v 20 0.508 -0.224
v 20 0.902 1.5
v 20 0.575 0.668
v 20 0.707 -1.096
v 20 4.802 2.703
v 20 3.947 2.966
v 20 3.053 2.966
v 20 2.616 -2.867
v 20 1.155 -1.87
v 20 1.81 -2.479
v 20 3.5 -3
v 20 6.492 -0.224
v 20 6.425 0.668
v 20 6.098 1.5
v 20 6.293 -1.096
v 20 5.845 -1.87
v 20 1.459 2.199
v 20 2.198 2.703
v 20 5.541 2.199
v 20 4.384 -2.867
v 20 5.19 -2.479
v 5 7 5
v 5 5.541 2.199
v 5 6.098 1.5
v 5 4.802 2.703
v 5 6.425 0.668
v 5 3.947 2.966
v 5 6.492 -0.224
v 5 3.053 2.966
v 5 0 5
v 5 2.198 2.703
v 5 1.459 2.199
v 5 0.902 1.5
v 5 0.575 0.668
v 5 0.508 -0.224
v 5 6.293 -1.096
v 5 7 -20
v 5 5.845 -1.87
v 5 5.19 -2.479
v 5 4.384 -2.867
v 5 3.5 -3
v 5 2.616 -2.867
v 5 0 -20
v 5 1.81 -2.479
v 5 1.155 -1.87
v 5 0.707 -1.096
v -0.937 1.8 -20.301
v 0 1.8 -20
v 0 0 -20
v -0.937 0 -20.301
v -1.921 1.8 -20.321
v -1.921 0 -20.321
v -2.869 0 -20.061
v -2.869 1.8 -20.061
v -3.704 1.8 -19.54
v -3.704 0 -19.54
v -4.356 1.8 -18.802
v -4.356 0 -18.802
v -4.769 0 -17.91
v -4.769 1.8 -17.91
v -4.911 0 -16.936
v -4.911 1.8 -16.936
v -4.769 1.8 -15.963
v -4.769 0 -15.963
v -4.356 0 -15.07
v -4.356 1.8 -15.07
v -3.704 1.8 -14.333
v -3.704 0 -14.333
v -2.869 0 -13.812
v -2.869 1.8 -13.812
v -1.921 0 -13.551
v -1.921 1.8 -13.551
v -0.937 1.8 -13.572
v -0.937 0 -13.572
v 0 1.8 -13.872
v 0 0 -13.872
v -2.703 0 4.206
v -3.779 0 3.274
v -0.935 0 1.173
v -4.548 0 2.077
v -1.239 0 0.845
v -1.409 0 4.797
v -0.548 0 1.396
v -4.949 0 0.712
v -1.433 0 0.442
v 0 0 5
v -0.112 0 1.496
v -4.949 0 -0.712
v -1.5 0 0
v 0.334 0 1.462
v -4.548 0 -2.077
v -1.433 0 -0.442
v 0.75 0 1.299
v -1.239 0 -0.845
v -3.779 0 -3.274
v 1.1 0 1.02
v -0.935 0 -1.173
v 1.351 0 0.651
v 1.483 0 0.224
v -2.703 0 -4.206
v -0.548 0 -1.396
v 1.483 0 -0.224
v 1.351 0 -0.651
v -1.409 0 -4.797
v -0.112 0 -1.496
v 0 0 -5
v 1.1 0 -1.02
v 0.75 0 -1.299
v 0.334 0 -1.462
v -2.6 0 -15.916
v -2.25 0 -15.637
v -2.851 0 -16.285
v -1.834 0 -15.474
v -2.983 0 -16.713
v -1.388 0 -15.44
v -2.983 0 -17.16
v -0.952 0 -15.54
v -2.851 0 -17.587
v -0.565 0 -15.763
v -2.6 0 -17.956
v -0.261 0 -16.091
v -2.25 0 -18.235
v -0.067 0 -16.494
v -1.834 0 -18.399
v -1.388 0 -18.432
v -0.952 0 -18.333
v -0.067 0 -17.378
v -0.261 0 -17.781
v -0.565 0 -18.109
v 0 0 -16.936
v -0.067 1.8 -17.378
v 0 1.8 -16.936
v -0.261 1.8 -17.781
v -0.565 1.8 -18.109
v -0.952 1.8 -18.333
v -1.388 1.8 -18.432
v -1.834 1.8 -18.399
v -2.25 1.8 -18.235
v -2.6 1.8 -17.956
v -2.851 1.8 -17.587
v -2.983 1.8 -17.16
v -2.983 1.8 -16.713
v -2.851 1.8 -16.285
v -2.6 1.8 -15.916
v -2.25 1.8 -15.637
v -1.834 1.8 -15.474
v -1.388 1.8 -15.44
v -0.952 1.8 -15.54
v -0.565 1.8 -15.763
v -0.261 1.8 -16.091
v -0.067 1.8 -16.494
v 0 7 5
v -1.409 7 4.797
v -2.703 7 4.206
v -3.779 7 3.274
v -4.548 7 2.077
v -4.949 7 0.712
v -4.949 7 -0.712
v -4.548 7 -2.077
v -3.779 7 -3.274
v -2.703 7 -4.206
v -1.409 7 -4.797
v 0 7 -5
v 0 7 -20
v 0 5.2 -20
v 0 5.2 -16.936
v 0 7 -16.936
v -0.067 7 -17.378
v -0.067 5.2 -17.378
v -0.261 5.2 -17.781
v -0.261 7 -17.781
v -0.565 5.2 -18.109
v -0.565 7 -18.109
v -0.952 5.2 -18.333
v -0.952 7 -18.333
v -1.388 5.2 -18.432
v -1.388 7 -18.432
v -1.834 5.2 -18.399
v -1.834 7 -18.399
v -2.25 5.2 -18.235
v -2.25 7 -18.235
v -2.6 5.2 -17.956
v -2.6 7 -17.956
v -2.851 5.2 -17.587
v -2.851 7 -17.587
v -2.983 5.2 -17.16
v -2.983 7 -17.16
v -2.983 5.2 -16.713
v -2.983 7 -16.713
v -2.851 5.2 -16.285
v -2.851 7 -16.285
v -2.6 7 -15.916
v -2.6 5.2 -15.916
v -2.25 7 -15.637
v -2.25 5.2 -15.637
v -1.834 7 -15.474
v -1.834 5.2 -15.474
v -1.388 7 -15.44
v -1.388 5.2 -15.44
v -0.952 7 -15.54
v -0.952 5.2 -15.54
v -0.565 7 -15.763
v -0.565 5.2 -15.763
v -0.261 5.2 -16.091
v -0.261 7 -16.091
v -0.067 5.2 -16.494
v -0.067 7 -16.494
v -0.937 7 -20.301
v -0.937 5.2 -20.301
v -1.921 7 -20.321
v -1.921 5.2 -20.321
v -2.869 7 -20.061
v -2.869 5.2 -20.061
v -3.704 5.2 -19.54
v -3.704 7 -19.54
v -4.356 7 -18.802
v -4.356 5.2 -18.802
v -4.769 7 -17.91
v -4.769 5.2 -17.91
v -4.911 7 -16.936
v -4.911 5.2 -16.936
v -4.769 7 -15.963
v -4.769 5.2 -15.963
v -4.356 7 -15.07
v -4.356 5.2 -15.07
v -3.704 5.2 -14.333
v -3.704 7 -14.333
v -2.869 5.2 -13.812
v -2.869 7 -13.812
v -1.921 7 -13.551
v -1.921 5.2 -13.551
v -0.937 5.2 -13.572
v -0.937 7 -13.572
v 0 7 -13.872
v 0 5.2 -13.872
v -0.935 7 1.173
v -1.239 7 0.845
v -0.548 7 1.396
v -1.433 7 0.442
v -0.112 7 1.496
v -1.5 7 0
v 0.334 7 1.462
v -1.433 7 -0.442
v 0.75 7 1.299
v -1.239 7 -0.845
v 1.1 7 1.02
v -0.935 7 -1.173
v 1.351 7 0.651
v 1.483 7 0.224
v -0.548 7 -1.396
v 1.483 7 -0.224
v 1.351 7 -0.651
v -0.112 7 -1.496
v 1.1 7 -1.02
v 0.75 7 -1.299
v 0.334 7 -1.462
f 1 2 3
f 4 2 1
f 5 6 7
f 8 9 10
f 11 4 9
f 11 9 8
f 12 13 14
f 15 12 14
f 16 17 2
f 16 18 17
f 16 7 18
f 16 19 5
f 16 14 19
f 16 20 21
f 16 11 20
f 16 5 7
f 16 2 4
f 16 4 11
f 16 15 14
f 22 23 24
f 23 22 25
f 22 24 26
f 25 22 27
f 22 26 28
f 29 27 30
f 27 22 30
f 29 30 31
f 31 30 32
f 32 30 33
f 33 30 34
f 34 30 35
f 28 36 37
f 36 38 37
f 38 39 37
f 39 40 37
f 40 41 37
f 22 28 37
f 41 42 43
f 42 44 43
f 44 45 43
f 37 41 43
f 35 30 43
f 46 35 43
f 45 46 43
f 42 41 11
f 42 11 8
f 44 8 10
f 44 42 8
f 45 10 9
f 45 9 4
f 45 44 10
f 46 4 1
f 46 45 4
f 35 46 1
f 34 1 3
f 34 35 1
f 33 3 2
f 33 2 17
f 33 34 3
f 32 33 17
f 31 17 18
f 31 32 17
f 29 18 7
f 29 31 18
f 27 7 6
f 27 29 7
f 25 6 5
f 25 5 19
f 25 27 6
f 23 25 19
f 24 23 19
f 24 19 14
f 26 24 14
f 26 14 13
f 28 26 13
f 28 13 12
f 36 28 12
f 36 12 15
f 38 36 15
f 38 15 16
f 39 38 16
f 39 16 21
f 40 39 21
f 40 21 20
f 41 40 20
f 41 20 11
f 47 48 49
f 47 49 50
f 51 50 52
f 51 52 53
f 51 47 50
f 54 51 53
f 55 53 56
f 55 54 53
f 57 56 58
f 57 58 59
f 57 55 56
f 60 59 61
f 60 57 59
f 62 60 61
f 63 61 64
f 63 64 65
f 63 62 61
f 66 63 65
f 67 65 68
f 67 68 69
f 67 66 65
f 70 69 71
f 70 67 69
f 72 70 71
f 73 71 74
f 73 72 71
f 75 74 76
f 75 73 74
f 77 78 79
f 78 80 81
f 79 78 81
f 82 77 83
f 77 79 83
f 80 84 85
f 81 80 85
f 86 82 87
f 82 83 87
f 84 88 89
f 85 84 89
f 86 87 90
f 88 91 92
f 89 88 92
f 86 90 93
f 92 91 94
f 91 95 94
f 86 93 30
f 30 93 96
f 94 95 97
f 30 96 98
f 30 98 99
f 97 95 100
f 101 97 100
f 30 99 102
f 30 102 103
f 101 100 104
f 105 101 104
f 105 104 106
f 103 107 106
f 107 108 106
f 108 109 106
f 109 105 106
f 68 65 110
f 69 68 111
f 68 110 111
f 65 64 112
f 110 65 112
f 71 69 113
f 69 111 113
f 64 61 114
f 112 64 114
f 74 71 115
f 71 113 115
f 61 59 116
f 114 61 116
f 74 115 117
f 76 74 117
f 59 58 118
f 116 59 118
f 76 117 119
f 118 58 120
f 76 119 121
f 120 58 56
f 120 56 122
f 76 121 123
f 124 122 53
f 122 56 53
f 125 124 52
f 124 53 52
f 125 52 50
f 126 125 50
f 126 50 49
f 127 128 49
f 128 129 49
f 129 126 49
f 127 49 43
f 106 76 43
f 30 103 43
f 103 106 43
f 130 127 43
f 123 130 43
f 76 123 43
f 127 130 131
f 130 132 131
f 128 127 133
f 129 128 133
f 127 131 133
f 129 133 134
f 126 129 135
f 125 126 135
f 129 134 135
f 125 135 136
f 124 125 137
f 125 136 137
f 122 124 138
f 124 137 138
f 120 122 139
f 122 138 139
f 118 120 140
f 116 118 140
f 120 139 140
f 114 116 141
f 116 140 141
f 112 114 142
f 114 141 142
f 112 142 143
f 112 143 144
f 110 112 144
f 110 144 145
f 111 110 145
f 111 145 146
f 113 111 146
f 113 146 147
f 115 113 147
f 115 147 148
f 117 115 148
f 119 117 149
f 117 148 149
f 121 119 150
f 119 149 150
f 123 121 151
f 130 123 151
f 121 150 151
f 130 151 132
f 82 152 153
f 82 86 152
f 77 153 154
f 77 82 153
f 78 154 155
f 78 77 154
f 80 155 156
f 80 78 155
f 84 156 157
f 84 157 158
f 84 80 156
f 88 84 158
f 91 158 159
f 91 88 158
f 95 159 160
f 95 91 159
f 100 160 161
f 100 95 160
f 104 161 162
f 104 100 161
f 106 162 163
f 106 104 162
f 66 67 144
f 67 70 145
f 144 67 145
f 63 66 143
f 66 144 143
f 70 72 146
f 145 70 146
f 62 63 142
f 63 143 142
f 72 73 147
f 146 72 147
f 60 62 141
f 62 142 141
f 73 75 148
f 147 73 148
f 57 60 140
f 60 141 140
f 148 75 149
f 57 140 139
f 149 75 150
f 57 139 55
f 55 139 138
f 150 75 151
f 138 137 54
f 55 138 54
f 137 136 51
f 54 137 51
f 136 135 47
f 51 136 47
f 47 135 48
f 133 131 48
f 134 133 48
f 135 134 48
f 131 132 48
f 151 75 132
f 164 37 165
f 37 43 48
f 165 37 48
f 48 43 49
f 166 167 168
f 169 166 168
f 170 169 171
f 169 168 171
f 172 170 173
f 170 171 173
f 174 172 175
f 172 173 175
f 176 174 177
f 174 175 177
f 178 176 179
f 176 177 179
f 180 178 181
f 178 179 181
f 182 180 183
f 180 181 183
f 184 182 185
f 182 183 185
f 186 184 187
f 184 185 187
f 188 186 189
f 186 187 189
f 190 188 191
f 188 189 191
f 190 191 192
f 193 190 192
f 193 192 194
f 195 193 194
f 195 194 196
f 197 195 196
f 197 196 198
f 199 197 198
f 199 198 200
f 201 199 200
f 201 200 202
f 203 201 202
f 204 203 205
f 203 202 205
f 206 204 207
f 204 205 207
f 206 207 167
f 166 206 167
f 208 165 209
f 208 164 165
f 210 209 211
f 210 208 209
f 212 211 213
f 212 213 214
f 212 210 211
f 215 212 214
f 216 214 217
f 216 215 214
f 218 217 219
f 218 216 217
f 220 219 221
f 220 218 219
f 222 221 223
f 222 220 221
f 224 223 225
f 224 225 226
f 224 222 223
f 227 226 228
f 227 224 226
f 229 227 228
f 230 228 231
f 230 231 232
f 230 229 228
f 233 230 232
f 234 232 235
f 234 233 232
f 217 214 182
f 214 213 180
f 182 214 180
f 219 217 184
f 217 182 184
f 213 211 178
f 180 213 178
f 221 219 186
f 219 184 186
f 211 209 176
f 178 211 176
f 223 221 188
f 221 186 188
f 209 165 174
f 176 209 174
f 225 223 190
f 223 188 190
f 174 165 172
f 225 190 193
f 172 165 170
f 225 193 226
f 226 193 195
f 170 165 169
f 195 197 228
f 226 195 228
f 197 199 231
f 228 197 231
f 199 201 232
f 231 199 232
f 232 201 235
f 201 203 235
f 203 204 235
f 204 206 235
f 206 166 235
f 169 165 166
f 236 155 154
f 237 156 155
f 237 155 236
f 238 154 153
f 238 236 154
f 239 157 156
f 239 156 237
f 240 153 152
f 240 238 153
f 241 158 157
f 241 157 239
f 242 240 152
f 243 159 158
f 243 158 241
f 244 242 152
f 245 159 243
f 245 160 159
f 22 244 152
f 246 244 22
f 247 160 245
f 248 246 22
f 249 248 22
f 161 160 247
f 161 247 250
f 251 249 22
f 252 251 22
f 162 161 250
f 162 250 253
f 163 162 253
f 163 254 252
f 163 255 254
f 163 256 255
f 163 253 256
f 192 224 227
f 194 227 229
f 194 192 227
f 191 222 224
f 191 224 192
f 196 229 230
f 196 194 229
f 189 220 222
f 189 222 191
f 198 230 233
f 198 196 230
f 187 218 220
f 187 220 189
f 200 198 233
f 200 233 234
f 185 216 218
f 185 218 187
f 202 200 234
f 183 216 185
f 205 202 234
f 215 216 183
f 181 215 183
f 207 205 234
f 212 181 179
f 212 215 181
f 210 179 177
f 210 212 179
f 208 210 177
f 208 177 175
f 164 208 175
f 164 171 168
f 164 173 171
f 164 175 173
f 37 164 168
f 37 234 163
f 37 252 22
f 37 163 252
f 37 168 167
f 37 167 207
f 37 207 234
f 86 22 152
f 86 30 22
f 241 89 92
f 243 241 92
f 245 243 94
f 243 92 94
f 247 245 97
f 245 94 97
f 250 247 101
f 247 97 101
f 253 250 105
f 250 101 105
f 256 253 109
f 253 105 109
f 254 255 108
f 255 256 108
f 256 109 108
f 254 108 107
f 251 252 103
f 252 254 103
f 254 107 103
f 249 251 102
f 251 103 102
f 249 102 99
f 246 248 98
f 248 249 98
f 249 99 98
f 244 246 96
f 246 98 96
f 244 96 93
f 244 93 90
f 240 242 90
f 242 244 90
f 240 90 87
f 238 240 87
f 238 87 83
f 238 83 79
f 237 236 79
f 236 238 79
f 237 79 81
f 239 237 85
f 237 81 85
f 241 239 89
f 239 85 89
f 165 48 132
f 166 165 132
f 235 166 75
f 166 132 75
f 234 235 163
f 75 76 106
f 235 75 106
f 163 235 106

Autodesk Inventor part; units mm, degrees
ref_plane "YZ Plane" through (0, 0, 0) normal (1, 0, 0) x (0, 1, 0)
ref_plane "XZ Plane" through (0, 0, 0) normal (0, 1, 0) x (-1, 0, 0)
ref_plane "XY Plane" through (0, 0, 0) normal (0, 0, 1) x (1, 0, 0)
sketch "Sketch1" plane through (0, 0, 0) normal (0, 1, 0) x (-1, 0, 0)
  circle A0 centre (0, 0) radius 1.5
  circle A1 centre (0, 0) radius 5
  line L0 (-5, 0) -> (-5, 5)
  line L1 (-5, 5) -> (0, 5)
  line L2 (-5, 0) -> (-5, -20)
  line L3 (-5, -20) -> (-1.5, -20)
  line L4 (-5, -20) -> (0, -20)
  line L5 (0, -20) -> (0, -5)
  dimension "d0" = 3
  dimension "d1" = 10
  dimension "d2" = 20
extrude "Extrusion1" add sketch "Sketch1" along normal blind 7
sketch "Sketch2" plane through (5, 0, 5) normal (1, 0, 0) x (0, 0, -1)
  line L0 (10, 7) -> (0, 7) projected
  line L1 (0, 7) -> (0, 3.5)
  line L2 (0, 0) -> (25, 0) projected
  line L3 (0, 3.5) -> (5, 3.5)
  circle A0 centre (5, 3.5) radius 3
  point P0 (5, 0)
  dimension "d5" = 3.5
  dimension "d6" = 6
extrude "Extrusion2" add sketch "Sketch2" along normal blind 15
sketch "Sketch3" plane through (5, 0, 5) normal (1, 0, 0) x (0, 0, -1)
  point P0 (5, 0)
sketch "Sketch7" plane through (0, 7, 0) normal (0, 1, 0) x (1, 0, 0)
  line L0 (0, 19.9362) -> (0, 16.9362)
  line L1 (0, 20) -> (0, 5) projected
  line L2 (0, 16.9362) -> (-1.5, 16.9362)
  circle A0 centre (-1.5, 16.9362) radius 1.5
  circle A1 centre (-1.5, 16.9362) radius 3.4113
  point P0 (0, 0)
  point P1 (0, 13.8723)
  dimension "d25" = 3
  dimension "d26" = 1.5
extrude "Extrusion6" add sketch "Sketch7" against normal blind 7 contours L0 L1 A1 picked at (-0.578, 19.5142)
sketch "Sketch8" plane through (0, 0, -5) normal (-1, 0, 0) x (0, 0, 1)
  line L0 (-8.8723, 7) -> (0, 7) projected
  line L1 (-7.6834, 7) -> (-4.1834, 7)
  line L2 (-7.6834, 7) -> (-7.6834, 3.5)
  line L3 (-7.6834, 7) -> (-4.1834, 7) construction
  line L4 (-7.6834, 3.5) -> (-7.6834, 1.8)
  line L5 (-7.6834, 1.8) -> (-17.6834, 1.8)
  line L6 (-17.6834, 1.8) -> (-17.6834, 5.2)
  line L7 (-17.6834, 5.2) -> (-7.6834, 5.2)
  line L8 (-7.6834, 5.2) -> (-7.6834, 1.8)
  point P0 (5, 0)
  point P1 (-7.6834, 5.2)
  dimension "d29" = 3.5
  dimension "d30" = 3.5
  dimension "d31" = 90
  dimension "d32" = 1.7
  dimension "d33" = 10
  dimension "d34" = 3.4
extrude "Extrusion7" cut sketch "Sketch8" along normal blind 7
properties part number "stuur_ARMPJE"
